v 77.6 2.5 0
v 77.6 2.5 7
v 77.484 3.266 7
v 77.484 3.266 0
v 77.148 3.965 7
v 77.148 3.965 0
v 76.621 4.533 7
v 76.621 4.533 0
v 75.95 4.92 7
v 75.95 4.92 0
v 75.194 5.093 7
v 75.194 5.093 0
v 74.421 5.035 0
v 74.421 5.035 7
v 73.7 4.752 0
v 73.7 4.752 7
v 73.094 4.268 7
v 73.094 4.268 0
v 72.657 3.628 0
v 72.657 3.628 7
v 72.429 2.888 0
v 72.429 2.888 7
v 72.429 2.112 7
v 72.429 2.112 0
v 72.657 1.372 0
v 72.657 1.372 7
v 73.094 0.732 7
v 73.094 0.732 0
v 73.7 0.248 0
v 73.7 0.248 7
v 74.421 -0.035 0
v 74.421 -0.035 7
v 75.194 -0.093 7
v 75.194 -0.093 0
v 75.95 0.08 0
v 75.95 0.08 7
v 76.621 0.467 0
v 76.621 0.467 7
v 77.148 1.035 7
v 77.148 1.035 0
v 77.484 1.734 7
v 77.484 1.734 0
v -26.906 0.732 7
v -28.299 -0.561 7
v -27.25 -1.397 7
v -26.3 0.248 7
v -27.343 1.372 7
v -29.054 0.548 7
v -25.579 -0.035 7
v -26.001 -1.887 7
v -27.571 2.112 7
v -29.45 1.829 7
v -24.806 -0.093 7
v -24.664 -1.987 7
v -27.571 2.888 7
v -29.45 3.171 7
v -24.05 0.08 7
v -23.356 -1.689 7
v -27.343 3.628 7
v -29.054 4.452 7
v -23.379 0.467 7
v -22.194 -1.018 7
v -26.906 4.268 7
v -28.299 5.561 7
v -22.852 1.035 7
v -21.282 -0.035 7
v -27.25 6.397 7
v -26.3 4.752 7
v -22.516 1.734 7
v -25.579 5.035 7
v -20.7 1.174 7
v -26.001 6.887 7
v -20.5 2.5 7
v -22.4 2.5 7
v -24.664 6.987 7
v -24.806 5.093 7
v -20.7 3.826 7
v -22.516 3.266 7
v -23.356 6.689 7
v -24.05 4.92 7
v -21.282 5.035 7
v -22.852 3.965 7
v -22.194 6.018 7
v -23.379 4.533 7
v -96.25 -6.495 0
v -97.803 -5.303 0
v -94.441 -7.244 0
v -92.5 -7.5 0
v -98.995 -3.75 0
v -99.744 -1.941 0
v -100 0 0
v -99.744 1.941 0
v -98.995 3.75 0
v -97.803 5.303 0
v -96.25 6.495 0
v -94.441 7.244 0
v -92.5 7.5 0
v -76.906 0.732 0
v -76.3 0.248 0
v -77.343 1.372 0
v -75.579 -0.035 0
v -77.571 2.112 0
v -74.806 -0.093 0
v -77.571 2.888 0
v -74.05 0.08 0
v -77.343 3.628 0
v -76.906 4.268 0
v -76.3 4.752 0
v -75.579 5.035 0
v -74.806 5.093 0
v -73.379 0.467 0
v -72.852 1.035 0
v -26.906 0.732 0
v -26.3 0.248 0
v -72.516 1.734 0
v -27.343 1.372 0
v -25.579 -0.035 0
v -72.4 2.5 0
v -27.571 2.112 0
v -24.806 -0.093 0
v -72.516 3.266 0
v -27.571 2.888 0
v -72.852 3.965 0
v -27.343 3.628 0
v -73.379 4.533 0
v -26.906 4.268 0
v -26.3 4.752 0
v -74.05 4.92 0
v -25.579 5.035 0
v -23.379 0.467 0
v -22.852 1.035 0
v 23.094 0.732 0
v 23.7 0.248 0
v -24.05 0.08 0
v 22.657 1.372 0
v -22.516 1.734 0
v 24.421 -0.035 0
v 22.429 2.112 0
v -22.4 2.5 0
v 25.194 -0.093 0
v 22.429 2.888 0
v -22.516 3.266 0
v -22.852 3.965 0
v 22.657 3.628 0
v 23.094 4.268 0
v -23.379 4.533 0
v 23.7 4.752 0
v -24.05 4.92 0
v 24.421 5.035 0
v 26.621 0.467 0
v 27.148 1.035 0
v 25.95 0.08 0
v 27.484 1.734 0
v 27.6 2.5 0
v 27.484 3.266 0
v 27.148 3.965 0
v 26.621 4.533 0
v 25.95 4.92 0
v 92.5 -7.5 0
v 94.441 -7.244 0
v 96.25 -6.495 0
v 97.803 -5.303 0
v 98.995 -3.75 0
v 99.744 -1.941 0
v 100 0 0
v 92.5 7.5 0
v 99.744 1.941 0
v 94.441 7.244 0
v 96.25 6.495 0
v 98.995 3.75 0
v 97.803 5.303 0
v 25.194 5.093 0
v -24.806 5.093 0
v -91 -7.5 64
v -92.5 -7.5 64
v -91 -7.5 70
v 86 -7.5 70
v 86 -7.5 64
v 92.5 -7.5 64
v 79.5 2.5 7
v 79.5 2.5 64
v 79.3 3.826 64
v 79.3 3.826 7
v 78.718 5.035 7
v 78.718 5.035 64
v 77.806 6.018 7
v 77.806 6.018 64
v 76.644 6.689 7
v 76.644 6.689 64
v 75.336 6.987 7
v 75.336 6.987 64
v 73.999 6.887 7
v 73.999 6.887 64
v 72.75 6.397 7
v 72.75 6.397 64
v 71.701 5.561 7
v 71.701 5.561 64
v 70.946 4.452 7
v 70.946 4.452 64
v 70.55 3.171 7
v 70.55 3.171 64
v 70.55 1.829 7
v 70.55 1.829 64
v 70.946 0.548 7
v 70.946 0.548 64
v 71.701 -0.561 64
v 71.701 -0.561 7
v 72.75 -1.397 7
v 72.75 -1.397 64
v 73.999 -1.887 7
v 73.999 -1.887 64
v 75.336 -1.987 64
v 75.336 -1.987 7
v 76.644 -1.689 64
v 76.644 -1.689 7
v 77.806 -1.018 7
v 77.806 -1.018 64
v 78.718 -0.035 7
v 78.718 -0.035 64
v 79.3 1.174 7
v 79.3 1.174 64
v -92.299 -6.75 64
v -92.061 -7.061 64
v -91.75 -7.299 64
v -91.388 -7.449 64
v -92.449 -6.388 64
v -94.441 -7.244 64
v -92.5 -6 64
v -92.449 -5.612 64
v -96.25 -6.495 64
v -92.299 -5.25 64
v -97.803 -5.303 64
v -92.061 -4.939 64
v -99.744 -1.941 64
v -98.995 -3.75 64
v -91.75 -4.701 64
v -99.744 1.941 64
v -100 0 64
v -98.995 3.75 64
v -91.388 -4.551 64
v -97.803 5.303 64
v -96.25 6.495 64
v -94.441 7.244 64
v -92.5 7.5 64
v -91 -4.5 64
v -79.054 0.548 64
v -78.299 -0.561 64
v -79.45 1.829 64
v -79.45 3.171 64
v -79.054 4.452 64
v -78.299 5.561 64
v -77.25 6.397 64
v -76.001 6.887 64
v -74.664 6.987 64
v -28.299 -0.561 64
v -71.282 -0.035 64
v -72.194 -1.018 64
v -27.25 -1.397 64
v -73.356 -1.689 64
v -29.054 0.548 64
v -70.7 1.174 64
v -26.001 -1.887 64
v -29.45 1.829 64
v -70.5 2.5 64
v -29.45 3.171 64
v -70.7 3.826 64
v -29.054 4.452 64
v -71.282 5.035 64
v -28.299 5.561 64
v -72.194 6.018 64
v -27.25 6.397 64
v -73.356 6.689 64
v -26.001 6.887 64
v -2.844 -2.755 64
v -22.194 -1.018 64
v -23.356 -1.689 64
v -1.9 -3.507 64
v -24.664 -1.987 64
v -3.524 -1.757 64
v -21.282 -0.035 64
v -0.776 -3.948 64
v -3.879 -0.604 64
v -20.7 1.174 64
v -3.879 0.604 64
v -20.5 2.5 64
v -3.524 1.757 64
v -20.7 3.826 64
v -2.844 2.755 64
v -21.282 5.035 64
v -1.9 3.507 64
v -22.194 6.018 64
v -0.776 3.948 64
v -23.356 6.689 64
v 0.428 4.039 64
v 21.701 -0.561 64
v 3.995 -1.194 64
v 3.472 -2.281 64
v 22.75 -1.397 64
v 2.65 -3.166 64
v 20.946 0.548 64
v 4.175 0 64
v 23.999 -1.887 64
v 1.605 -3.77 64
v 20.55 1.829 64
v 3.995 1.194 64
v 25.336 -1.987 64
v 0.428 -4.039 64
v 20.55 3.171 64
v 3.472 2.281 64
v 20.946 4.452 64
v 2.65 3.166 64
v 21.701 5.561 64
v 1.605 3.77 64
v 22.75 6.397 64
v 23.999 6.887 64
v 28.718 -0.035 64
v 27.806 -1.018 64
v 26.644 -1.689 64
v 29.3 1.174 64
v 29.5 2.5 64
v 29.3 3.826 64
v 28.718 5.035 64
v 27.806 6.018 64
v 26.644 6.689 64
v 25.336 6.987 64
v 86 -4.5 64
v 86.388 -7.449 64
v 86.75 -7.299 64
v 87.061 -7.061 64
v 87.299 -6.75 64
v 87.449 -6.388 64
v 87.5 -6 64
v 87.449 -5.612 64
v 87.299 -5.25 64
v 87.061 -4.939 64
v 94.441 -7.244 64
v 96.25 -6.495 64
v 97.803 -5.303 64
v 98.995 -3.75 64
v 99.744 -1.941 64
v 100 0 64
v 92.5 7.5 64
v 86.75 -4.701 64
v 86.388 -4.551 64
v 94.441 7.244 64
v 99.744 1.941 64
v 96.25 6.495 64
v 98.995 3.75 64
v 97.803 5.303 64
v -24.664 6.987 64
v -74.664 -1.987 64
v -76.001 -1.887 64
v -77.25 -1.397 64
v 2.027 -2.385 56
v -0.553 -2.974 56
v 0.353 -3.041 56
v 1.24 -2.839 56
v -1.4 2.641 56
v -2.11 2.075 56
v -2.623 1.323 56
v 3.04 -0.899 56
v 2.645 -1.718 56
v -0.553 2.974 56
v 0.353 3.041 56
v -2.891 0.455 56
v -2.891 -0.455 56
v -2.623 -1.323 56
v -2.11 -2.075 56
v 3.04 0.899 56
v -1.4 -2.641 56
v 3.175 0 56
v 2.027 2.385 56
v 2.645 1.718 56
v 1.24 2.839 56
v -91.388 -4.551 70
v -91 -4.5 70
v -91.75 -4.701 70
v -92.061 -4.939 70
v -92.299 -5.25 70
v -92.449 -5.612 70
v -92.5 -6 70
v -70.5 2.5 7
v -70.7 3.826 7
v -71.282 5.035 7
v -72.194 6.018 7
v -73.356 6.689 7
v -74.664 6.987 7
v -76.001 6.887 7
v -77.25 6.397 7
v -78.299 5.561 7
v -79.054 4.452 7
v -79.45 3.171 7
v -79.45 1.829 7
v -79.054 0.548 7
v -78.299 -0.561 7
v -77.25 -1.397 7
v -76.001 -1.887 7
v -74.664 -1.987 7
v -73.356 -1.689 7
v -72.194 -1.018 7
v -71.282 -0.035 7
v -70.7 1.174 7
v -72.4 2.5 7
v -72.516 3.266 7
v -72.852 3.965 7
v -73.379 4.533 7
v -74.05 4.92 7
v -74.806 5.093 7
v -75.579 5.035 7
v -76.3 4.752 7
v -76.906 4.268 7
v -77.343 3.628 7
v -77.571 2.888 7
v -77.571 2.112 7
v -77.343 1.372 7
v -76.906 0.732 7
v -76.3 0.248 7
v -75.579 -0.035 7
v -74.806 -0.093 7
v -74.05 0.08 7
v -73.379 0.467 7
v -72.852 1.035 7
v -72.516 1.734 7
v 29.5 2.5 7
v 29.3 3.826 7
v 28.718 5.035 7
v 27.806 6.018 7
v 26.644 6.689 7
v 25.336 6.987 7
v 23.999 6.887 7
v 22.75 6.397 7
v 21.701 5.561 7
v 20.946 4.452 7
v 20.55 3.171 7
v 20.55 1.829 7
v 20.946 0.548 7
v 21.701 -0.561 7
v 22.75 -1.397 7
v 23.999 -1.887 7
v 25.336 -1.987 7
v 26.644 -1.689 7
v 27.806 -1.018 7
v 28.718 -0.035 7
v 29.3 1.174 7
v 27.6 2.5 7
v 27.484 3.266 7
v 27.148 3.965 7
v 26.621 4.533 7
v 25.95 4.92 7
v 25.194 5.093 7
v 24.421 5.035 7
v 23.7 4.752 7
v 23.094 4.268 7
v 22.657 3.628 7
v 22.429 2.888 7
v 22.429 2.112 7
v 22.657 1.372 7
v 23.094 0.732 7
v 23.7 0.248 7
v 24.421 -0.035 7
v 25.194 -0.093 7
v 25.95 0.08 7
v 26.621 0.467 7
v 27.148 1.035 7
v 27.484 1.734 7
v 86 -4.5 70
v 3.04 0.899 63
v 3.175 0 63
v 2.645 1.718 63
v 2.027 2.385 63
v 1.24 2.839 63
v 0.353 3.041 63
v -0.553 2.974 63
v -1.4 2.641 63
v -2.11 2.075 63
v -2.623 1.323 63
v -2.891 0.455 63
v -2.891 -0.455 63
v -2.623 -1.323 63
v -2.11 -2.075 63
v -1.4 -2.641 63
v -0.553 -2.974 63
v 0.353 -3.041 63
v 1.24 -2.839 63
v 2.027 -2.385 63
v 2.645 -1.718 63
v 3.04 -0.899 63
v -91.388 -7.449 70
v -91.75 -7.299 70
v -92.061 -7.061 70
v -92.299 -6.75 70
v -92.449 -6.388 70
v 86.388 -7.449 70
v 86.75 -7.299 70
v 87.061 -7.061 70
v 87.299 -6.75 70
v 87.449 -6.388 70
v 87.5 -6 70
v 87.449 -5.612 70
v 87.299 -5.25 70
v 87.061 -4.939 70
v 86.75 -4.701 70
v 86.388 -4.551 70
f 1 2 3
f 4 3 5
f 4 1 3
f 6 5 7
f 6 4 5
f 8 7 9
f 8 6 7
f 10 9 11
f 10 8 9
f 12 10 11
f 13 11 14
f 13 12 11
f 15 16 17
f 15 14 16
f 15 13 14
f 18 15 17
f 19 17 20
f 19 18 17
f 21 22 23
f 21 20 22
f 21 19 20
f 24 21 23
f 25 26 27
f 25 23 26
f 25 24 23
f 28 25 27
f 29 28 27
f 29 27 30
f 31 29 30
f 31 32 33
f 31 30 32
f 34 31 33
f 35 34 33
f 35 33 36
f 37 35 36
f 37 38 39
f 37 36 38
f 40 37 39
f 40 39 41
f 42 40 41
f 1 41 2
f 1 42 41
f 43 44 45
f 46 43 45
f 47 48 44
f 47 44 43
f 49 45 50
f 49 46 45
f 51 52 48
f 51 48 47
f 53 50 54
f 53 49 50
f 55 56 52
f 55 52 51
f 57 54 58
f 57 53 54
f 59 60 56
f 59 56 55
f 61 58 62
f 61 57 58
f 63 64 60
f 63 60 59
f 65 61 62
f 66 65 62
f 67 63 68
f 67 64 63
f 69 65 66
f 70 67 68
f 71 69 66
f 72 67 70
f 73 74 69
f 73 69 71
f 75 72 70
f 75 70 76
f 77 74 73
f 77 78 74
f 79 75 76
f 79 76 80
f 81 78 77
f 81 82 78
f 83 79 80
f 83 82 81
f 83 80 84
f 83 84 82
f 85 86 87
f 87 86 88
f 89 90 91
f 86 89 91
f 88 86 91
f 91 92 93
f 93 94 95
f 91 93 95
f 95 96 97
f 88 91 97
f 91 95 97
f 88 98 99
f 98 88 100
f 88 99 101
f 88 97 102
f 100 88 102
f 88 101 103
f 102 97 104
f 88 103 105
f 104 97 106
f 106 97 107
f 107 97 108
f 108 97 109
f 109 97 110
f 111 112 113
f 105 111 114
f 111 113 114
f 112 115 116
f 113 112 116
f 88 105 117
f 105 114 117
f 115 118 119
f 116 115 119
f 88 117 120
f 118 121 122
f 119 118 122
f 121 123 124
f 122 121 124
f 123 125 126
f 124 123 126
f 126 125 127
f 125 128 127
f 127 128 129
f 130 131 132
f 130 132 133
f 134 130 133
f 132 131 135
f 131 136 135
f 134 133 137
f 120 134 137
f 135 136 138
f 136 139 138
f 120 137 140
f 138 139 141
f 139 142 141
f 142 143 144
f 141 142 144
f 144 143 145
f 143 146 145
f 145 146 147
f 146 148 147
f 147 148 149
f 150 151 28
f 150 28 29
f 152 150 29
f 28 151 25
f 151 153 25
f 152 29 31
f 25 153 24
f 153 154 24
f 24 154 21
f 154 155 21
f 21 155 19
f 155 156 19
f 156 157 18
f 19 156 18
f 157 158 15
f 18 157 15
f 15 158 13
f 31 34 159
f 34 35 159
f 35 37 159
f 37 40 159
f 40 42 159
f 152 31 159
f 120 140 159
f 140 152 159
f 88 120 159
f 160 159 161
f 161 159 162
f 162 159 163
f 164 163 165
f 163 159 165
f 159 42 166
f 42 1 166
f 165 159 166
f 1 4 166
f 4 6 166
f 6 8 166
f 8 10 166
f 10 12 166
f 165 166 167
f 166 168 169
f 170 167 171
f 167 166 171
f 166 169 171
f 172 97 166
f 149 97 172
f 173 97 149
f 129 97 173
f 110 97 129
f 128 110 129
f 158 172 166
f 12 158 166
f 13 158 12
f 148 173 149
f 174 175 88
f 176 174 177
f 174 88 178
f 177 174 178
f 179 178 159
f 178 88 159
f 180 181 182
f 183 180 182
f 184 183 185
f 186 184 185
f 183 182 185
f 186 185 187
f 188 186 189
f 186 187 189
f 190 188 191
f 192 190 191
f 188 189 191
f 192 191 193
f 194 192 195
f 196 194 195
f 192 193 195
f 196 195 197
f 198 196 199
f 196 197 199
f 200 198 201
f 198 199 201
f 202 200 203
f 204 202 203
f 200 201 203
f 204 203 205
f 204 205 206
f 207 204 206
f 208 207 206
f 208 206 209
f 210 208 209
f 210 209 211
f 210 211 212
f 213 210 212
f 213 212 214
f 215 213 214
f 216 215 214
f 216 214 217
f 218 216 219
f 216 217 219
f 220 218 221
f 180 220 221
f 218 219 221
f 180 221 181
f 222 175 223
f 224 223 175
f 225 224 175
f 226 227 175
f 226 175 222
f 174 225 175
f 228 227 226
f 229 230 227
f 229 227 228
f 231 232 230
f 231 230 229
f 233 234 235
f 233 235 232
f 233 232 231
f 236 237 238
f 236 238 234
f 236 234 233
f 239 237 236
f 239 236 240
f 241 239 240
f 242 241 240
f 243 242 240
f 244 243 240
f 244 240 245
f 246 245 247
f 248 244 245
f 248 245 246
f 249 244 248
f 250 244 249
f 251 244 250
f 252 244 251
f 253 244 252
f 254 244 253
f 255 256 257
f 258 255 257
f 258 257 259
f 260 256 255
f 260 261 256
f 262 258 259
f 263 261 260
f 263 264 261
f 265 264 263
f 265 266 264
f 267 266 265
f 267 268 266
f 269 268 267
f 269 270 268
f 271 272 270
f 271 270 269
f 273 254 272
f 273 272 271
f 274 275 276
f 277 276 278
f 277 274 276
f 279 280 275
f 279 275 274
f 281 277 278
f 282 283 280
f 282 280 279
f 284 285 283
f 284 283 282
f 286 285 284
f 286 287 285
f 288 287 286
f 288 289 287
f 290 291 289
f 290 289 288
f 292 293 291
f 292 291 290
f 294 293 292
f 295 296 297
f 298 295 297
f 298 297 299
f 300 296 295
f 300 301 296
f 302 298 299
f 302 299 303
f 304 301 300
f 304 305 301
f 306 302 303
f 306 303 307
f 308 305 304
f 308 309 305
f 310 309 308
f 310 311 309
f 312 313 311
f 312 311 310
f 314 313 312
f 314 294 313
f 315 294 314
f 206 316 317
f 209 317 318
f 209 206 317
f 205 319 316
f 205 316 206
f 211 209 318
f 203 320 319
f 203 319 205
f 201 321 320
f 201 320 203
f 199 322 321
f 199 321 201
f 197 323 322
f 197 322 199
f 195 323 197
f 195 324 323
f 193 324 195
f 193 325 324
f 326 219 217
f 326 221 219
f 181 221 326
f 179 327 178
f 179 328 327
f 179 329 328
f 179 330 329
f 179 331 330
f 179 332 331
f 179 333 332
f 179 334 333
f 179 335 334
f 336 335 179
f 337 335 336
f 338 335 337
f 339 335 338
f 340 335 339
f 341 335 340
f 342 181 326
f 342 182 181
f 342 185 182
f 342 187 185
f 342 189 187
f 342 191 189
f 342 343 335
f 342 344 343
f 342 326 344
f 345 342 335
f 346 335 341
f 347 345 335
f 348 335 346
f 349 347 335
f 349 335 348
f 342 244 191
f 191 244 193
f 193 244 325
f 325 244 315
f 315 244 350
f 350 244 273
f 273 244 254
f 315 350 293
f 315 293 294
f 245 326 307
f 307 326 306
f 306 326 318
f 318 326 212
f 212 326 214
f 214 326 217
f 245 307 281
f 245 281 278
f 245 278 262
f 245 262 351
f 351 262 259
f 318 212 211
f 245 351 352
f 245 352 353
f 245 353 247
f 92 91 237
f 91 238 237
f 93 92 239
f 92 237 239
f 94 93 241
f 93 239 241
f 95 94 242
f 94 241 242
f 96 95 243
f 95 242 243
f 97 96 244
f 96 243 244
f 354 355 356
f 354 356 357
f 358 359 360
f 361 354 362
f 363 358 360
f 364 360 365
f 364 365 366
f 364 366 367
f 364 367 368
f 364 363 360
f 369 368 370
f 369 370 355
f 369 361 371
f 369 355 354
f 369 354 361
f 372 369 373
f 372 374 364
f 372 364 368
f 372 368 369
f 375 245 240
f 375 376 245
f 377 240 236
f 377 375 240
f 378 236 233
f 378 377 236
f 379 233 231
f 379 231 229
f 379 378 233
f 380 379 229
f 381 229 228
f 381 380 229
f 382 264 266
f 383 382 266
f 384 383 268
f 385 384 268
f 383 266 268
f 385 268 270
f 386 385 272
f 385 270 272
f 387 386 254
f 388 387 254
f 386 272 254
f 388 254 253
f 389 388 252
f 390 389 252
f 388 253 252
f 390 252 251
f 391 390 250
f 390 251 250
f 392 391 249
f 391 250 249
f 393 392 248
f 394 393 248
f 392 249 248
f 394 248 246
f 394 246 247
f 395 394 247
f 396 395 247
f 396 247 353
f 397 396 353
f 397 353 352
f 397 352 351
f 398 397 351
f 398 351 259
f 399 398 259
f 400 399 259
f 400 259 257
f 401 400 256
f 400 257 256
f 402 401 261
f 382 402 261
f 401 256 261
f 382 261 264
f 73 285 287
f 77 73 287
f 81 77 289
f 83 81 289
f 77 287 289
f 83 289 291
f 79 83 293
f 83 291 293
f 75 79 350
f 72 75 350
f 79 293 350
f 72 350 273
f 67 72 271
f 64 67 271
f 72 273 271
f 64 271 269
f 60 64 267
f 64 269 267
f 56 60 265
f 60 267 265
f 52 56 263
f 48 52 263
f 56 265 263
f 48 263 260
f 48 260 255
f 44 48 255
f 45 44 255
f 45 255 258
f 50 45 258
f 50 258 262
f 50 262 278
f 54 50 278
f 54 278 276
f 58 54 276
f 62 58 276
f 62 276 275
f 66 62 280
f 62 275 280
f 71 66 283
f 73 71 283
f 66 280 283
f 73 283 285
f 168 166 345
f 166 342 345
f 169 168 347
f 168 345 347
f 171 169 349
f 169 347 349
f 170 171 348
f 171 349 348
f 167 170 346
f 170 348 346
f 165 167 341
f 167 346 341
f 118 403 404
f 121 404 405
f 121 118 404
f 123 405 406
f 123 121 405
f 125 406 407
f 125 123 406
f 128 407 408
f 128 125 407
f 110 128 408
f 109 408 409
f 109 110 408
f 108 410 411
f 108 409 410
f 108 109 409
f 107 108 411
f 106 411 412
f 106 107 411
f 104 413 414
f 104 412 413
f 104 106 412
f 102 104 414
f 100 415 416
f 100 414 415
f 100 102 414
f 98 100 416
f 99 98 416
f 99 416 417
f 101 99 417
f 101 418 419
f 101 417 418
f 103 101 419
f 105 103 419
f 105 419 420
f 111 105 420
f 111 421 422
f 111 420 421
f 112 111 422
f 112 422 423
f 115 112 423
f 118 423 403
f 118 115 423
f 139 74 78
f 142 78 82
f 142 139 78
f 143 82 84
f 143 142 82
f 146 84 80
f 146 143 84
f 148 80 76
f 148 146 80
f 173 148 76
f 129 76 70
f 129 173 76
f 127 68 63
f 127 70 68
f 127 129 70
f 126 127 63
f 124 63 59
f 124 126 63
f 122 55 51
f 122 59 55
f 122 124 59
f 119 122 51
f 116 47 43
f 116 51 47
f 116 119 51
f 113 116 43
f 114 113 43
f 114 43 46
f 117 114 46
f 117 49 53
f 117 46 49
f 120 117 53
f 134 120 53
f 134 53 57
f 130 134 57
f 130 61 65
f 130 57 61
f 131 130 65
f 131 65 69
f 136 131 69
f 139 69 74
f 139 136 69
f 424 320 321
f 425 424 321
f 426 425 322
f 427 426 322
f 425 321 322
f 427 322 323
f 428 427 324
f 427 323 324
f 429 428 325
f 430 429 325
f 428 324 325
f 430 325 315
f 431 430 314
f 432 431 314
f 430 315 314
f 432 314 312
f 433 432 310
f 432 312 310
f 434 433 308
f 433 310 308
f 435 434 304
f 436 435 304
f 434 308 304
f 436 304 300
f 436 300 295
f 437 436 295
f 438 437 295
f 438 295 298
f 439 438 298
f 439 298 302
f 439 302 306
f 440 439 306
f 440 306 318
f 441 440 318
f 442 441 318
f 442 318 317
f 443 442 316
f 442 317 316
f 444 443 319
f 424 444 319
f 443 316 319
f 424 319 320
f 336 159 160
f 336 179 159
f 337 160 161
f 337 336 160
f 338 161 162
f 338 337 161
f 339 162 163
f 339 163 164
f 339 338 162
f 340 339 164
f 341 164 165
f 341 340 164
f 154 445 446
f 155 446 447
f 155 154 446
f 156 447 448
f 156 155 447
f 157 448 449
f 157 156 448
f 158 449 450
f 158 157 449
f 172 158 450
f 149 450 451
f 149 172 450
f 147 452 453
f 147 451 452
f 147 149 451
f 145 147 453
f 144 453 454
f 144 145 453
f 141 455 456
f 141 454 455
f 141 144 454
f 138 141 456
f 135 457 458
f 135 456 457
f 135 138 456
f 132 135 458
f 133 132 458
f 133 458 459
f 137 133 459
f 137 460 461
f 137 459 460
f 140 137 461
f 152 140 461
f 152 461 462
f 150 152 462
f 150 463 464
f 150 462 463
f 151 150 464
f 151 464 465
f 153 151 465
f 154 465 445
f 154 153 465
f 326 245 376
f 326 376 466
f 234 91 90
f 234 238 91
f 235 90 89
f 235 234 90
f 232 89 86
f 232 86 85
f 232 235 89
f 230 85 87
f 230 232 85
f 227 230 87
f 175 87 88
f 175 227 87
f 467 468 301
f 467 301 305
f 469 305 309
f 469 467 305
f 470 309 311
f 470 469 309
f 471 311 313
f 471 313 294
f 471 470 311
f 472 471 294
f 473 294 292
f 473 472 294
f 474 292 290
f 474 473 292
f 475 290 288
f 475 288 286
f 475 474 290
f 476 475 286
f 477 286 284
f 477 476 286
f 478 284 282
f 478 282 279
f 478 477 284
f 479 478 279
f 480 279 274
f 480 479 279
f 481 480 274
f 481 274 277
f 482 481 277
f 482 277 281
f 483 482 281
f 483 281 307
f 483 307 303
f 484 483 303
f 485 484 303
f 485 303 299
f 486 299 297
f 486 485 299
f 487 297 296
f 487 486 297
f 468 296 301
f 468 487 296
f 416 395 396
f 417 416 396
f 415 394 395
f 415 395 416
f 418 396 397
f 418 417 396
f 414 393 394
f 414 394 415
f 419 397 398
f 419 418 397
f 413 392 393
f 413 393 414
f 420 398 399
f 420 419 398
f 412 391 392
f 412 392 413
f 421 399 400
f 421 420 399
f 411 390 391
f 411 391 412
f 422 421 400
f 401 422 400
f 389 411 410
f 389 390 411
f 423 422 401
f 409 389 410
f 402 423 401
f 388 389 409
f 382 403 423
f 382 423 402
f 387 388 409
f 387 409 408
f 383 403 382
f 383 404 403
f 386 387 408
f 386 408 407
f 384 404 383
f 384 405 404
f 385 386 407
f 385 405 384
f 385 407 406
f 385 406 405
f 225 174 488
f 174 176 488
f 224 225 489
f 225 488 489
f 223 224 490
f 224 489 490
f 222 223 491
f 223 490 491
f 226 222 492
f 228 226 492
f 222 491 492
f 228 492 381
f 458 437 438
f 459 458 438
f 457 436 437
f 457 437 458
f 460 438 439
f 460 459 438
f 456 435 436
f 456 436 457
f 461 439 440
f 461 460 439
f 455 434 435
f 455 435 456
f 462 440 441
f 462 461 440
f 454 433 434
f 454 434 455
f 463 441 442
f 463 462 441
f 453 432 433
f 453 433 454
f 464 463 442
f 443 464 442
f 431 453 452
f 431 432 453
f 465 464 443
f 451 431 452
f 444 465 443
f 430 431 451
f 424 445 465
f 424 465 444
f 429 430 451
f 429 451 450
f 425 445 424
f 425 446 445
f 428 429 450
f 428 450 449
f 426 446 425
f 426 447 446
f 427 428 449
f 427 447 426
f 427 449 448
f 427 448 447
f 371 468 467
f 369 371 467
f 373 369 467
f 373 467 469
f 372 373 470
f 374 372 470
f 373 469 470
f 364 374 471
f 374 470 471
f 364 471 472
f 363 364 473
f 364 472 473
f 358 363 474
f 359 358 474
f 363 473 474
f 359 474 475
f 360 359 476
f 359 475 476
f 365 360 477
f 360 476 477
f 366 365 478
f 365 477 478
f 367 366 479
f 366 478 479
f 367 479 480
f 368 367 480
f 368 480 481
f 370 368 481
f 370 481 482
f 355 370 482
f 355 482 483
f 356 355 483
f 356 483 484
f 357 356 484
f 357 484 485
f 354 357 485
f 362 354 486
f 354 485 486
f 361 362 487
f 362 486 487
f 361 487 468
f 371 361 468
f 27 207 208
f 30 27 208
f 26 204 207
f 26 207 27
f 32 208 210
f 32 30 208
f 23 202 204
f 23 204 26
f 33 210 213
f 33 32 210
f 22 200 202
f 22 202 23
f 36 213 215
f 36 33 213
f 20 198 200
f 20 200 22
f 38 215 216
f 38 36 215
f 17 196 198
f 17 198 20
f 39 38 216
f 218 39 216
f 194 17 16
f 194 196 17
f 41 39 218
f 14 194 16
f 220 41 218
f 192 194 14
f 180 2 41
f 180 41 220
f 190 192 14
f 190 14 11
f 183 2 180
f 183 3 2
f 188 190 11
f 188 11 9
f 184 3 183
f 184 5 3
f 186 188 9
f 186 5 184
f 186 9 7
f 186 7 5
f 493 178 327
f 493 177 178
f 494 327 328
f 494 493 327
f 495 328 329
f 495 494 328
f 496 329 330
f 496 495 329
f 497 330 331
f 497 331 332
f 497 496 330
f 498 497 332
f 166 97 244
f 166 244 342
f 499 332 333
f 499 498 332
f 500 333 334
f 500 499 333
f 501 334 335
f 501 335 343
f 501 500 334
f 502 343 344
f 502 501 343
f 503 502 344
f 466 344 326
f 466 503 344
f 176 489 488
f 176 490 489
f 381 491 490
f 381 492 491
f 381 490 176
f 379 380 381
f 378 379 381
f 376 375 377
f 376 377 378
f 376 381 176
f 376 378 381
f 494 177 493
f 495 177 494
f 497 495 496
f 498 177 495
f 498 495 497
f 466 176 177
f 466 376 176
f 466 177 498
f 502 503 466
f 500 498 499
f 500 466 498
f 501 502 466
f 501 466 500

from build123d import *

# Parameters (mm, degrees)
SKETCH1_W           = 200
SKETCH1_H           = 15
SKETCH1_R           = 2.6
BOSS_EXTRUDE1_DEPTH = 64
SKETCH2_R           = 4.5
CUT_EXTRUDE1_DEPTH  = 57
FILLET3_R           = 7.5
SKETCH3_W           = 180
SKETCH3_H           = 3
BOSS_EXTRUDE2_DEPTH = 6
FILLET4_R           = 1.5
SKETCH4_R           = 3.05
CUT_EXTRUDE2_DEPTH  = 8
CHAMFER1_SIZE       = 1


with BuildPart() as part:
    # Sketch1 → Boss-Extrude1 (new body)
    with BuildSketch(Plane.XY):
        Rectangle(SKETCH1_W, SKETCH1_H)
        with Locations((75, 2.5)):
            Circle(SKETCH1_R, mode=Mode.SUBTRACT)
        with Locations((25, 2.5)):
            Circle(SKETCH1_R, mode=Mode.SUBTRACT)
        with Locations((-25, 2.5)):
            Circle(SKETCH1_R, mode=Mode.SUBTRACT)
        with Locations((-75, 2.5)):
            Circle(SKETCH1_R, mode=Mode.SUBTRACT)
    extrude(amount=BOSS_EXTRUDE1_DEPTH)

    # Sketch2 → Cut-Extrude1 (cut)
    with BuildSketch(Plane.XY.offset(64)):
        with Locations((-75, 2.5)):
            Circle(SKETCH2_R)
        with Locations((-25, 2.5)):
            Circle(SKETCH2_R)
        with Locations((25, 2.5)):
            Circle(SKETCH2_R)
        with Locations((75, 2.5)):
            Circle(SKETCH2_R)
    extrude(amount=-CUT_EXTRUDE1_DEPTH, mode=Mode.SUBTRACT)

    # Fillet3
    fillet3_edges = [part.edges().sort_by_distance(p)[0] for p in [
        (100, 7.5, 32),
        (100, -7.5, 32),
        (-100, 7.5, 32),
        (-100, -7.5, 32),
    ]]
    fillet(fillet3_edges, radius=FILLET3_R - 0.0001)  # a hair under: the kernel refuses the full size

    # Sketch3 → Boss-Extrude2 (add)
    with BuildSketch(Plane.XY.offset(64)):
        with Locations((-2.5, -6)):
            Rectangle(SKETCH3_W, SKETCH3_H)
    extrude(amount=BOSS_EXTRUDE2_DEPTH)

    # Fillet4
    fillet4_edges = [part.edges().sort_by_distance(p)[0] for p in [
        (87.5, -4.5, 67),
        (87.5, -7.5, 67),
        (-92.5, -7.5, 67),
        (-92.5, -4.5, 67),
    ]]
    fillet(fillet4_edges, radius=FILLET4_R - 0.0001)  # a hair under: the kernel refuses the full size

    # Sketch4 → Cut-Extrude2 (cut)
    with BuildSketch(Plane.XY.offset(64)):
        with Locations((0.125314072, 0)):
            Circle(SKETCH4_R)
    extrude(amount=-CUT_EXTRUDE2_DEPTH, mode=Mode.SUBTRACT)

    # Chamfer1
    chamfer1_edges = [part.edges().sort_by_distance(p)[0] for p in [
        (-2.924685928, 0, 64),
    ]]
    chamfer(chamfer1_edges, length=CHAMFER1_SIZE)


solid = part.part
